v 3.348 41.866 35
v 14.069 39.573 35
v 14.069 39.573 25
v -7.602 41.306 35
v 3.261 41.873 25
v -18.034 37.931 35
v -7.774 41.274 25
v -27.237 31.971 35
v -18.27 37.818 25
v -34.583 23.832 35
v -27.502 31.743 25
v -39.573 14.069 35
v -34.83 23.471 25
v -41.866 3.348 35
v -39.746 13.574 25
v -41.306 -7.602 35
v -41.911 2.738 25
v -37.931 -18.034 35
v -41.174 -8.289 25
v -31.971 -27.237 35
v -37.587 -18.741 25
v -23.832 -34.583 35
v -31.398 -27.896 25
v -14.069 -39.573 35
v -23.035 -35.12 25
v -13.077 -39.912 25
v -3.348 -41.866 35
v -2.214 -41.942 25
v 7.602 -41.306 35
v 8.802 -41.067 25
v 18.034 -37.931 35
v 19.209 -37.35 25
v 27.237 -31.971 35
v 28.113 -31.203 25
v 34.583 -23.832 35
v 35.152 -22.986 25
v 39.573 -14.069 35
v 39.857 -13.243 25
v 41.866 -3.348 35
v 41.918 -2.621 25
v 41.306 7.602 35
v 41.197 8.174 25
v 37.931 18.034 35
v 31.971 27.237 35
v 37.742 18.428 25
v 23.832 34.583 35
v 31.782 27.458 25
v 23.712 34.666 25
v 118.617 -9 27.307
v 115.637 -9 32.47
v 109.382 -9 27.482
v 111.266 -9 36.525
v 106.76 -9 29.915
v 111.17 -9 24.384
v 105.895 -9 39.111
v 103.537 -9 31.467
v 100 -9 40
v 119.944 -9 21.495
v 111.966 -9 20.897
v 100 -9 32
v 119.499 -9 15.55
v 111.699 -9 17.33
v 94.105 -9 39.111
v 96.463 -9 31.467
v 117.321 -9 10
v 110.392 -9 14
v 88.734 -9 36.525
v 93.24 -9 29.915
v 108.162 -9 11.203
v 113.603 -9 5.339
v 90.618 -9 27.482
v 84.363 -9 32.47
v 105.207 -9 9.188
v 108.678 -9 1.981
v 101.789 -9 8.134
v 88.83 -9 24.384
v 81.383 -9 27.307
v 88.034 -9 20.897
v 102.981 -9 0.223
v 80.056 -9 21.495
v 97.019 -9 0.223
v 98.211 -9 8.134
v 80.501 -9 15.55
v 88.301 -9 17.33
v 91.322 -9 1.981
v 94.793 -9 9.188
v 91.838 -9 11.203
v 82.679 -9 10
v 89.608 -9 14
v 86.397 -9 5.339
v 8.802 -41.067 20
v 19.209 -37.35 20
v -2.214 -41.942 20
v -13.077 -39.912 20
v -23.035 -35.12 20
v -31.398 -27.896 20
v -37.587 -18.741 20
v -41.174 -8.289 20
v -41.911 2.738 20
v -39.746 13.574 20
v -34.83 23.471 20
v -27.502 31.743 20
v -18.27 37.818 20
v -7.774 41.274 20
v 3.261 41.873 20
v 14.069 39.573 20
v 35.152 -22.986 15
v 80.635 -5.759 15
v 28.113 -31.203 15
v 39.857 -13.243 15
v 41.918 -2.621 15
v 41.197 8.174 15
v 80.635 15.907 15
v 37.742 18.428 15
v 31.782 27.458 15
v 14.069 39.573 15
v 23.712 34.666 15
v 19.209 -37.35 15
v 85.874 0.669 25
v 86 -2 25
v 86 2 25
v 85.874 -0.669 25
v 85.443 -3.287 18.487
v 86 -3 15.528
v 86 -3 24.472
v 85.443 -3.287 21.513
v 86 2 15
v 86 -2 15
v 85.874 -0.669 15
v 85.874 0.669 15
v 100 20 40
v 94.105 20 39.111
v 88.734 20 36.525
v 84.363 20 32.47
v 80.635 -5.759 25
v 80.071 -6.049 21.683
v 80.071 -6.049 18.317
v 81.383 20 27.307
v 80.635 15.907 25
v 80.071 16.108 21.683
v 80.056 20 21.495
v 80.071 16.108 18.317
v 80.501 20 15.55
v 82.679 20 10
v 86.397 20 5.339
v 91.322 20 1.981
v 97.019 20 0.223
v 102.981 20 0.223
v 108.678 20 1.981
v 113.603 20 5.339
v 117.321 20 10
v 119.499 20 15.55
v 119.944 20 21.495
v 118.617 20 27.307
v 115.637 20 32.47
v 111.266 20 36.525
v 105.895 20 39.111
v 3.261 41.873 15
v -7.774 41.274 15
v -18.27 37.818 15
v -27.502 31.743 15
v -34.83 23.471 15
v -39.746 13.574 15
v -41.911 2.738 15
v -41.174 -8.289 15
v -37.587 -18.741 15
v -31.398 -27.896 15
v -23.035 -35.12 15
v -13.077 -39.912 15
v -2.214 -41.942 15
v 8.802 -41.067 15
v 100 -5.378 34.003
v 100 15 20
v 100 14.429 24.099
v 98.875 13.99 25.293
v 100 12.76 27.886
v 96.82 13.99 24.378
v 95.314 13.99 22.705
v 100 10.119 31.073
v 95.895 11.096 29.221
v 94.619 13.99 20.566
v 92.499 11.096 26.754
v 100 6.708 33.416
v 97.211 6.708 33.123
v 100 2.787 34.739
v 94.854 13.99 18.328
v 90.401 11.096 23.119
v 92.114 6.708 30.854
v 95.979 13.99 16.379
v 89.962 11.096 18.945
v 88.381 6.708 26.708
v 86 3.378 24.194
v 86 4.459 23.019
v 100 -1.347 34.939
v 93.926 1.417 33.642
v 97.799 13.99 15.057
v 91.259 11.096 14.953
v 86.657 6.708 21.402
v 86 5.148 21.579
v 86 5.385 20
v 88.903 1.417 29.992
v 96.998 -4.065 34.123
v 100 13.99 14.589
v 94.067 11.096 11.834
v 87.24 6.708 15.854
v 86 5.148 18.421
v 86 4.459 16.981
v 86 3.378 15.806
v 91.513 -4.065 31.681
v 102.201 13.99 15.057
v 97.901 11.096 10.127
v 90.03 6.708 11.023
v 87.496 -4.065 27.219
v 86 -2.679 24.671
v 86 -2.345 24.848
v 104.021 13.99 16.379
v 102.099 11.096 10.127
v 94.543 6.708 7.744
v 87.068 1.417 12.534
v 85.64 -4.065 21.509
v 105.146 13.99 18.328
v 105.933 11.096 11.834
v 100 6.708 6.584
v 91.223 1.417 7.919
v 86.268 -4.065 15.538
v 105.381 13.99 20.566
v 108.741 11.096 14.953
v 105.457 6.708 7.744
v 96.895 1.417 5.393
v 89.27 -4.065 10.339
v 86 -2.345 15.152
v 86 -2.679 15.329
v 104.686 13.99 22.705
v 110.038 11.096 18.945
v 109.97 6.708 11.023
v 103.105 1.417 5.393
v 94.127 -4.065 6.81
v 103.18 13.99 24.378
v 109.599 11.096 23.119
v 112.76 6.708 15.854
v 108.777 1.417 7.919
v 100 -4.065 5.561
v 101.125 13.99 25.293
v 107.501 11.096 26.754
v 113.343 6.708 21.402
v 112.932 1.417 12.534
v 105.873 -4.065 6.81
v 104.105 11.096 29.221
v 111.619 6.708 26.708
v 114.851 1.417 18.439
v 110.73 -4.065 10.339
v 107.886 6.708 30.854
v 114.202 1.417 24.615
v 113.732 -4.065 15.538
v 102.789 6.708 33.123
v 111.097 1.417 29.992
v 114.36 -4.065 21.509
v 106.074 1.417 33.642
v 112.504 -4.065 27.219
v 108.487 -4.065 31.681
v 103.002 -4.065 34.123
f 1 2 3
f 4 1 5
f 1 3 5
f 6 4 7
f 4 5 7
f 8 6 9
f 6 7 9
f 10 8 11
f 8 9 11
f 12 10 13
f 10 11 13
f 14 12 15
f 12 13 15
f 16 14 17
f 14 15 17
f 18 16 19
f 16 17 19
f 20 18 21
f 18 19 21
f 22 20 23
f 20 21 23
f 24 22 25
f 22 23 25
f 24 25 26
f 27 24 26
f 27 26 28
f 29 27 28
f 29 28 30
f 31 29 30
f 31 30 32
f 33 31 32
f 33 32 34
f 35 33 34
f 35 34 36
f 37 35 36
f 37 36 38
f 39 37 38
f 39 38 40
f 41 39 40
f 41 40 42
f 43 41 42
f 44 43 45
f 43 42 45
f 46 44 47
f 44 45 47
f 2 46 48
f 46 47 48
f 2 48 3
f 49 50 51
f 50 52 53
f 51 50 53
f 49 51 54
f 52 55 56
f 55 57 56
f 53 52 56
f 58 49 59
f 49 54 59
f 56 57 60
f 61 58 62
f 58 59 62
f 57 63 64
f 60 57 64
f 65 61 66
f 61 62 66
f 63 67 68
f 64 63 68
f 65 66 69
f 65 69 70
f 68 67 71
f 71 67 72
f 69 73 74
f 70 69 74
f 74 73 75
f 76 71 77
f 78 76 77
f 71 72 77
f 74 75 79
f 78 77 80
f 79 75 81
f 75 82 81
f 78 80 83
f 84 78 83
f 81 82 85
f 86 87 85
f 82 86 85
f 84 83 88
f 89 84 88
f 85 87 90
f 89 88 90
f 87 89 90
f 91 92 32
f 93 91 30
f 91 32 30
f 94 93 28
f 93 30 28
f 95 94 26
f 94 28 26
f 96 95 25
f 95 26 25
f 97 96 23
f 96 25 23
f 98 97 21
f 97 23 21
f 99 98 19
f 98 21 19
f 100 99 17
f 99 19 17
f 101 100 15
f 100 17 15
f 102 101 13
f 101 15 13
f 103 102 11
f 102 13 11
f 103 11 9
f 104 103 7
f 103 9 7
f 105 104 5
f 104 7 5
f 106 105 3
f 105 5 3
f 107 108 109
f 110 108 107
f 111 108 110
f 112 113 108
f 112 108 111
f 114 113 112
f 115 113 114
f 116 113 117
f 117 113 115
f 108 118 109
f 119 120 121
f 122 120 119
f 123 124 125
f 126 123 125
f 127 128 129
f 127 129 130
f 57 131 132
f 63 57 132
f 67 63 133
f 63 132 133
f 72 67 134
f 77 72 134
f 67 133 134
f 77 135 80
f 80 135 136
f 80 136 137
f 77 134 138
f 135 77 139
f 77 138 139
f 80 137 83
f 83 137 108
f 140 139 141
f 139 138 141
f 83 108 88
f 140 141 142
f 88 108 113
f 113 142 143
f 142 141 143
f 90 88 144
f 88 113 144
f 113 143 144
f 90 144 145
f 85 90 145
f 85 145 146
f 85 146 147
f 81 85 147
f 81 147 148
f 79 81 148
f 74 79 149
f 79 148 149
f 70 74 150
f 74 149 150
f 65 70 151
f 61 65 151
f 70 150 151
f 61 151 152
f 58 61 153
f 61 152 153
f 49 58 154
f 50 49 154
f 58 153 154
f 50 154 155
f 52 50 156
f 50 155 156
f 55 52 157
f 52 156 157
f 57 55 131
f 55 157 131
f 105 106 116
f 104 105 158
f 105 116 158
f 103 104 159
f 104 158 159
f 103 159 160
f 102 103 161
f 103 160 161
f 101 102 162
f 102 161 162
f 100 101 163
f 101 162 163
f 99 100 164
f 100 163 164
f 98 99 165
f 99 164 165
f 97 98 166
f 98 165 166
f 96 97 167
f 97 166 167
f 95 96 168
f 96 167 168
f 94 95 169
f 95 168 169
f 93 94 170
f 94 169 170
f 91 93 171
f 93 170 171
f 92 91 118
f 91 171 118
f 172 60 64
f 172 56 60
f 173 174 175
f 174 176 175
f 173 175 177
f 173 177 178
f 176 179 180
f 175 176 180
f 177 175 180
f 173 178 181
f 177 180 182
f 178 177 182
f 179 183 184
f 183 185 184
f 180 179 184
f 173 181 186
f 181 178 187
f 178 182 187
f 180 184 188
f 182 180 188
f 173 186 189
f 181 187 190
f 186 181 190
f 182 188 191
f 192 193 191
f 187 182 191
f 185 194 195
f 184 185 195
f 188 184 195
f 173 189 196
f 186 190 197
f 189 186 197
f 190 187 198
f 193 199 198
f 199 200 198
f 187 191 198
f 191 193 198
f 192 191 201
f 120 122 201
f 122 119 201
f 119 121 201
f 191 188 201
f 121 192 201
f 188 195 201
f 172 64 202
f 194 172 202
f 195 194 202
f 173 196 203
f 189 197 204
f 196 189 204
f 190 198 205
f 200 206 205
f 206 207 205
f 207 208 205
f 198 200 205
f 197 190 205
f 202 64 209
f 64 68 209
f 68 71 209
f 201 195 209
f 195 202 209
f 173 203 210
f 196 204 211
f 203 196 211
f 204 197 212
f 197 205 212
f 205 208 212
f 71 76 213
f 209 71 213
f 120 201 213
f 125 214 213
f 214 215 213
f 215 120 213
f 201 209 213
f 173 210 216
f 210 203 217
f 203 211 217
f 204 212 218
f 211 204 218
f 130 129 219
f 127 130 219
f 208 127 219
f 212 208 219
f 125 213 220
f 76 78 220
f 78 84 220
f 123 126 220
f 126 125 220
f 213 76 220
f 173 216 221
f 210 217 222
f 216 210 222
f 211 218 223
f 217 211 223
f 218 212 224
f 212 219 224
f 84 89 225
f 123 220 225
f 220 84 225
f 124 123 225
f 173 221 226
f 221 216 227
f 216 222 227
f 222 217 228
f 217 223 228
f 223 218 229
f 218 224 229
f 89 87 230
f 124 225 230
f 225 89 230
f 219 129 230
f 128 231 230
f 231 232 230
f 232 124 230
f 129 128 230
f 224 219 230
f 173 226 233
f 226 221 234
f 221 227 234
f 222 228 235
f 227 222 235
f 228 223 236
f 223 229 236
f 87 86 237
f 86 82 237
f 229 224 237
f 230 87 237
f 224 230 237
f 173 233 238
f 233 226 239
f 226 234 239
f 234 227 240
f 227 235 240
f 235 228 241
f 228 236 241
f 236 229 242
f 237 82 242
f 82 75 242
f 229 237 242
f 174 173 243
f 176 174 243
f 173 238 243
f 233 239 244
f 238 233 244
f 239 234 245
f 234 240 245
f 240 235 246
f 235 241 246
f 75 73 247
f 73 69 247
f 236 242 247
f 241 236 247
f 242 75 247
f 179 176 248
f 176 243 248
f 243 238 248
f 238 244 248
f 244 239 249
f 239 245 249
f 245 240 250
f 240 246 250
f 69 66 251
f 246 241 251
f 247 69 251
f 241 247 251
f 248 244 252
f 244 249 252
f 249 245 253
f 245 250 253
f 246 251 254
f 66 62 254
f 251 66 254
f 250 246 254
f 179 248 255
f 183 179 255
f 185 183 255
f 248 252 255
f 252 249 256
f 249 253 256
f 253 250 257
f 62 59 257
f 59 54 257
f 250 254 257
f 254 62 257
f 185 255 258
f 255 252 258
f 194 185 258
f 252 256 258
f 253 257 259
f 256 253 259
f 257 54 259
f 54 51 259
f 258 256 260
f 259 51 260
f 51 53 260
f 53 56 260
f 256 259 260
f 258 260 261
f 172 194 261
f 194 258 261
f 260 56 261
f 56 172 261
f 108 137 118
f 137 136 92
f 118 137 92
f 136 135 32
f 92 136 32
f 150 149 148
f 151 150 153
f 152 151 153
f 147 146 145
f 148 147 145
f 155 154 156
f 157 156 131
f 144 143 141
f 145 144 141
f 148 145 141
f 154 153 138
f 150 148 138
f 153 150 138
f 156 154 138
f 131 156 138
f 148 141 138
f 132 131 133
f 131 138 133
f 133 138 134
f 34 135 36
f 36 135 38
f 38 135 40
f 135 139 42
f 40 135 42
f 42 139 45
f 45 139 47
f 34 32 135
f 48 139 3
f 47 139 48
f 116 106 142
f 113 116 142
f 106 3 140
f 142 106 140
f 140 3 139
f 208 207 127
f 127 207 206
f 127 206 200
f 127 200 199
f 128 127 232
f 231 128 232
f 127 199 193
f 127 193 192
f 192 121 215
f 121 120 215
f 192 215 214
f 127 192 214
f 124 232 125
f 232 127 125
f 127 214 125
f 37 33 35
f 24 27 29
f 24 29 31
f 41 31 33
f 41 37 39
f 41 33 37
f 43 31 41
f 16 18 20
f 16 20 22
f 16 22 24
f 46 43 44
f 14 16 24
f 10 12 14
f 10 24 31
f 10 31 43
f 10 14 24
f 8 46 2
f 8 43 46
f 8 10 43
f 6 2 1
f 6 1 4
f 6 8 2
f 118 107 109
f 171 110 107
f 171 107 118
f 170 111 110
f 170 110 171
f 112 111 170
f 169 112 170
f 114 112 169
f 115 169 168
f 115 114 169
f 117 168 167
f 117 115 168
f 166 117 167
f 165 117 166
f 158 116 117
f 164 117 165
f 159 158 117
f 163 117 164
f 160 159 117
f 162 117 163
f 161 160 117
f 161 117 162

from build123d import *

# Parameters (mm, degrees)
SKETCH_1_R          = 42
EXTRUDE_1_DEPTH     = 20
EXTRUDE_2_DEPTH     = 5
SKETCH_4_R          = 42
CUT_EXTRUDE_1_DEPTH = 15
SKETCH_5_R          = 42
EXTRUDE_3_DEPTH     = 10


with BuildPart() as part:
    # 草图1 → 凸台-拉伸1 (new body)
    with BuildSketch(Plane.XY):
        Circle(SKETCH_1_R)
    extrude(amount=EXTRUDE_1_DEPTH)



with BuildPart() as body_2:
    # 草图2 → 旋转1 (revolve)
    with BuildSketch(Plane.XY.offset(20), mode=Mode.PRIVATE) as revolve_1_sk:
        with BuildLine():
            Line((100, 20), (100, 15))
            ThreePointArc((100, 15), (86.583592135, 6.708203932), (88, -9))
            Line((88, -9), (80, -9))
            Line((80, -9), (80, 20))
            Line((80, 20), (100, 20))
        make_face()
    revolve(revolve_1_sk.sketch.rotate(Axis((100, 22.717290725, 20), (0, -1, 0)), 270), axis=Axis((100, 22.717290725, 20), (0, -1, 0)))


with BuildPart() as part_1:
    add(part.part)

    add(body_2.part)  # 凸台-拉伸2 merges body 2
    # 草图3 → 凸台-拉伸2 (add, symmetric)
    with BuildSketch(Plane.XY.offset(20)):
        with BuildLine():
            Line((14.069453744, 39.573355574), (86, 14))
            Line((86, 14), (86, -3))
            Line((86, -3), (19.208719722, -37.350034627))
            ThreePointArc((19.208719722, -37.350034627), (-41.906577017, -2.79978619), (14.069453744, 39.573355574))
        make_face()
    extrude(amount=EXTRUDE_2_DEPTH, both=True)

    # 草图4 → 切除-拉伸1 (cut)
    with BuildSketch(Plane(origin=(0, 0, 0), x_dir=(-1, 0, 0), z_dir=(0, 0, -1))):
        Circle(SKETCH_4_R)
    extrude(amount=-CUT_EXTRUDE_1_DEPTH, mode=Mode.SUBTRACT)

    # 草图5 → 凸台-拉伸3 (add)
    with BuildSketch(Plane.XY.offset(25)):
        with Locations(Location((0, 0, 0), (0, 0, 70.428252948))):
            Circle(SKETCH_5_R)
    extrude(amount=EXTRUDE_3_DEPTH)


solid = part_1.part
